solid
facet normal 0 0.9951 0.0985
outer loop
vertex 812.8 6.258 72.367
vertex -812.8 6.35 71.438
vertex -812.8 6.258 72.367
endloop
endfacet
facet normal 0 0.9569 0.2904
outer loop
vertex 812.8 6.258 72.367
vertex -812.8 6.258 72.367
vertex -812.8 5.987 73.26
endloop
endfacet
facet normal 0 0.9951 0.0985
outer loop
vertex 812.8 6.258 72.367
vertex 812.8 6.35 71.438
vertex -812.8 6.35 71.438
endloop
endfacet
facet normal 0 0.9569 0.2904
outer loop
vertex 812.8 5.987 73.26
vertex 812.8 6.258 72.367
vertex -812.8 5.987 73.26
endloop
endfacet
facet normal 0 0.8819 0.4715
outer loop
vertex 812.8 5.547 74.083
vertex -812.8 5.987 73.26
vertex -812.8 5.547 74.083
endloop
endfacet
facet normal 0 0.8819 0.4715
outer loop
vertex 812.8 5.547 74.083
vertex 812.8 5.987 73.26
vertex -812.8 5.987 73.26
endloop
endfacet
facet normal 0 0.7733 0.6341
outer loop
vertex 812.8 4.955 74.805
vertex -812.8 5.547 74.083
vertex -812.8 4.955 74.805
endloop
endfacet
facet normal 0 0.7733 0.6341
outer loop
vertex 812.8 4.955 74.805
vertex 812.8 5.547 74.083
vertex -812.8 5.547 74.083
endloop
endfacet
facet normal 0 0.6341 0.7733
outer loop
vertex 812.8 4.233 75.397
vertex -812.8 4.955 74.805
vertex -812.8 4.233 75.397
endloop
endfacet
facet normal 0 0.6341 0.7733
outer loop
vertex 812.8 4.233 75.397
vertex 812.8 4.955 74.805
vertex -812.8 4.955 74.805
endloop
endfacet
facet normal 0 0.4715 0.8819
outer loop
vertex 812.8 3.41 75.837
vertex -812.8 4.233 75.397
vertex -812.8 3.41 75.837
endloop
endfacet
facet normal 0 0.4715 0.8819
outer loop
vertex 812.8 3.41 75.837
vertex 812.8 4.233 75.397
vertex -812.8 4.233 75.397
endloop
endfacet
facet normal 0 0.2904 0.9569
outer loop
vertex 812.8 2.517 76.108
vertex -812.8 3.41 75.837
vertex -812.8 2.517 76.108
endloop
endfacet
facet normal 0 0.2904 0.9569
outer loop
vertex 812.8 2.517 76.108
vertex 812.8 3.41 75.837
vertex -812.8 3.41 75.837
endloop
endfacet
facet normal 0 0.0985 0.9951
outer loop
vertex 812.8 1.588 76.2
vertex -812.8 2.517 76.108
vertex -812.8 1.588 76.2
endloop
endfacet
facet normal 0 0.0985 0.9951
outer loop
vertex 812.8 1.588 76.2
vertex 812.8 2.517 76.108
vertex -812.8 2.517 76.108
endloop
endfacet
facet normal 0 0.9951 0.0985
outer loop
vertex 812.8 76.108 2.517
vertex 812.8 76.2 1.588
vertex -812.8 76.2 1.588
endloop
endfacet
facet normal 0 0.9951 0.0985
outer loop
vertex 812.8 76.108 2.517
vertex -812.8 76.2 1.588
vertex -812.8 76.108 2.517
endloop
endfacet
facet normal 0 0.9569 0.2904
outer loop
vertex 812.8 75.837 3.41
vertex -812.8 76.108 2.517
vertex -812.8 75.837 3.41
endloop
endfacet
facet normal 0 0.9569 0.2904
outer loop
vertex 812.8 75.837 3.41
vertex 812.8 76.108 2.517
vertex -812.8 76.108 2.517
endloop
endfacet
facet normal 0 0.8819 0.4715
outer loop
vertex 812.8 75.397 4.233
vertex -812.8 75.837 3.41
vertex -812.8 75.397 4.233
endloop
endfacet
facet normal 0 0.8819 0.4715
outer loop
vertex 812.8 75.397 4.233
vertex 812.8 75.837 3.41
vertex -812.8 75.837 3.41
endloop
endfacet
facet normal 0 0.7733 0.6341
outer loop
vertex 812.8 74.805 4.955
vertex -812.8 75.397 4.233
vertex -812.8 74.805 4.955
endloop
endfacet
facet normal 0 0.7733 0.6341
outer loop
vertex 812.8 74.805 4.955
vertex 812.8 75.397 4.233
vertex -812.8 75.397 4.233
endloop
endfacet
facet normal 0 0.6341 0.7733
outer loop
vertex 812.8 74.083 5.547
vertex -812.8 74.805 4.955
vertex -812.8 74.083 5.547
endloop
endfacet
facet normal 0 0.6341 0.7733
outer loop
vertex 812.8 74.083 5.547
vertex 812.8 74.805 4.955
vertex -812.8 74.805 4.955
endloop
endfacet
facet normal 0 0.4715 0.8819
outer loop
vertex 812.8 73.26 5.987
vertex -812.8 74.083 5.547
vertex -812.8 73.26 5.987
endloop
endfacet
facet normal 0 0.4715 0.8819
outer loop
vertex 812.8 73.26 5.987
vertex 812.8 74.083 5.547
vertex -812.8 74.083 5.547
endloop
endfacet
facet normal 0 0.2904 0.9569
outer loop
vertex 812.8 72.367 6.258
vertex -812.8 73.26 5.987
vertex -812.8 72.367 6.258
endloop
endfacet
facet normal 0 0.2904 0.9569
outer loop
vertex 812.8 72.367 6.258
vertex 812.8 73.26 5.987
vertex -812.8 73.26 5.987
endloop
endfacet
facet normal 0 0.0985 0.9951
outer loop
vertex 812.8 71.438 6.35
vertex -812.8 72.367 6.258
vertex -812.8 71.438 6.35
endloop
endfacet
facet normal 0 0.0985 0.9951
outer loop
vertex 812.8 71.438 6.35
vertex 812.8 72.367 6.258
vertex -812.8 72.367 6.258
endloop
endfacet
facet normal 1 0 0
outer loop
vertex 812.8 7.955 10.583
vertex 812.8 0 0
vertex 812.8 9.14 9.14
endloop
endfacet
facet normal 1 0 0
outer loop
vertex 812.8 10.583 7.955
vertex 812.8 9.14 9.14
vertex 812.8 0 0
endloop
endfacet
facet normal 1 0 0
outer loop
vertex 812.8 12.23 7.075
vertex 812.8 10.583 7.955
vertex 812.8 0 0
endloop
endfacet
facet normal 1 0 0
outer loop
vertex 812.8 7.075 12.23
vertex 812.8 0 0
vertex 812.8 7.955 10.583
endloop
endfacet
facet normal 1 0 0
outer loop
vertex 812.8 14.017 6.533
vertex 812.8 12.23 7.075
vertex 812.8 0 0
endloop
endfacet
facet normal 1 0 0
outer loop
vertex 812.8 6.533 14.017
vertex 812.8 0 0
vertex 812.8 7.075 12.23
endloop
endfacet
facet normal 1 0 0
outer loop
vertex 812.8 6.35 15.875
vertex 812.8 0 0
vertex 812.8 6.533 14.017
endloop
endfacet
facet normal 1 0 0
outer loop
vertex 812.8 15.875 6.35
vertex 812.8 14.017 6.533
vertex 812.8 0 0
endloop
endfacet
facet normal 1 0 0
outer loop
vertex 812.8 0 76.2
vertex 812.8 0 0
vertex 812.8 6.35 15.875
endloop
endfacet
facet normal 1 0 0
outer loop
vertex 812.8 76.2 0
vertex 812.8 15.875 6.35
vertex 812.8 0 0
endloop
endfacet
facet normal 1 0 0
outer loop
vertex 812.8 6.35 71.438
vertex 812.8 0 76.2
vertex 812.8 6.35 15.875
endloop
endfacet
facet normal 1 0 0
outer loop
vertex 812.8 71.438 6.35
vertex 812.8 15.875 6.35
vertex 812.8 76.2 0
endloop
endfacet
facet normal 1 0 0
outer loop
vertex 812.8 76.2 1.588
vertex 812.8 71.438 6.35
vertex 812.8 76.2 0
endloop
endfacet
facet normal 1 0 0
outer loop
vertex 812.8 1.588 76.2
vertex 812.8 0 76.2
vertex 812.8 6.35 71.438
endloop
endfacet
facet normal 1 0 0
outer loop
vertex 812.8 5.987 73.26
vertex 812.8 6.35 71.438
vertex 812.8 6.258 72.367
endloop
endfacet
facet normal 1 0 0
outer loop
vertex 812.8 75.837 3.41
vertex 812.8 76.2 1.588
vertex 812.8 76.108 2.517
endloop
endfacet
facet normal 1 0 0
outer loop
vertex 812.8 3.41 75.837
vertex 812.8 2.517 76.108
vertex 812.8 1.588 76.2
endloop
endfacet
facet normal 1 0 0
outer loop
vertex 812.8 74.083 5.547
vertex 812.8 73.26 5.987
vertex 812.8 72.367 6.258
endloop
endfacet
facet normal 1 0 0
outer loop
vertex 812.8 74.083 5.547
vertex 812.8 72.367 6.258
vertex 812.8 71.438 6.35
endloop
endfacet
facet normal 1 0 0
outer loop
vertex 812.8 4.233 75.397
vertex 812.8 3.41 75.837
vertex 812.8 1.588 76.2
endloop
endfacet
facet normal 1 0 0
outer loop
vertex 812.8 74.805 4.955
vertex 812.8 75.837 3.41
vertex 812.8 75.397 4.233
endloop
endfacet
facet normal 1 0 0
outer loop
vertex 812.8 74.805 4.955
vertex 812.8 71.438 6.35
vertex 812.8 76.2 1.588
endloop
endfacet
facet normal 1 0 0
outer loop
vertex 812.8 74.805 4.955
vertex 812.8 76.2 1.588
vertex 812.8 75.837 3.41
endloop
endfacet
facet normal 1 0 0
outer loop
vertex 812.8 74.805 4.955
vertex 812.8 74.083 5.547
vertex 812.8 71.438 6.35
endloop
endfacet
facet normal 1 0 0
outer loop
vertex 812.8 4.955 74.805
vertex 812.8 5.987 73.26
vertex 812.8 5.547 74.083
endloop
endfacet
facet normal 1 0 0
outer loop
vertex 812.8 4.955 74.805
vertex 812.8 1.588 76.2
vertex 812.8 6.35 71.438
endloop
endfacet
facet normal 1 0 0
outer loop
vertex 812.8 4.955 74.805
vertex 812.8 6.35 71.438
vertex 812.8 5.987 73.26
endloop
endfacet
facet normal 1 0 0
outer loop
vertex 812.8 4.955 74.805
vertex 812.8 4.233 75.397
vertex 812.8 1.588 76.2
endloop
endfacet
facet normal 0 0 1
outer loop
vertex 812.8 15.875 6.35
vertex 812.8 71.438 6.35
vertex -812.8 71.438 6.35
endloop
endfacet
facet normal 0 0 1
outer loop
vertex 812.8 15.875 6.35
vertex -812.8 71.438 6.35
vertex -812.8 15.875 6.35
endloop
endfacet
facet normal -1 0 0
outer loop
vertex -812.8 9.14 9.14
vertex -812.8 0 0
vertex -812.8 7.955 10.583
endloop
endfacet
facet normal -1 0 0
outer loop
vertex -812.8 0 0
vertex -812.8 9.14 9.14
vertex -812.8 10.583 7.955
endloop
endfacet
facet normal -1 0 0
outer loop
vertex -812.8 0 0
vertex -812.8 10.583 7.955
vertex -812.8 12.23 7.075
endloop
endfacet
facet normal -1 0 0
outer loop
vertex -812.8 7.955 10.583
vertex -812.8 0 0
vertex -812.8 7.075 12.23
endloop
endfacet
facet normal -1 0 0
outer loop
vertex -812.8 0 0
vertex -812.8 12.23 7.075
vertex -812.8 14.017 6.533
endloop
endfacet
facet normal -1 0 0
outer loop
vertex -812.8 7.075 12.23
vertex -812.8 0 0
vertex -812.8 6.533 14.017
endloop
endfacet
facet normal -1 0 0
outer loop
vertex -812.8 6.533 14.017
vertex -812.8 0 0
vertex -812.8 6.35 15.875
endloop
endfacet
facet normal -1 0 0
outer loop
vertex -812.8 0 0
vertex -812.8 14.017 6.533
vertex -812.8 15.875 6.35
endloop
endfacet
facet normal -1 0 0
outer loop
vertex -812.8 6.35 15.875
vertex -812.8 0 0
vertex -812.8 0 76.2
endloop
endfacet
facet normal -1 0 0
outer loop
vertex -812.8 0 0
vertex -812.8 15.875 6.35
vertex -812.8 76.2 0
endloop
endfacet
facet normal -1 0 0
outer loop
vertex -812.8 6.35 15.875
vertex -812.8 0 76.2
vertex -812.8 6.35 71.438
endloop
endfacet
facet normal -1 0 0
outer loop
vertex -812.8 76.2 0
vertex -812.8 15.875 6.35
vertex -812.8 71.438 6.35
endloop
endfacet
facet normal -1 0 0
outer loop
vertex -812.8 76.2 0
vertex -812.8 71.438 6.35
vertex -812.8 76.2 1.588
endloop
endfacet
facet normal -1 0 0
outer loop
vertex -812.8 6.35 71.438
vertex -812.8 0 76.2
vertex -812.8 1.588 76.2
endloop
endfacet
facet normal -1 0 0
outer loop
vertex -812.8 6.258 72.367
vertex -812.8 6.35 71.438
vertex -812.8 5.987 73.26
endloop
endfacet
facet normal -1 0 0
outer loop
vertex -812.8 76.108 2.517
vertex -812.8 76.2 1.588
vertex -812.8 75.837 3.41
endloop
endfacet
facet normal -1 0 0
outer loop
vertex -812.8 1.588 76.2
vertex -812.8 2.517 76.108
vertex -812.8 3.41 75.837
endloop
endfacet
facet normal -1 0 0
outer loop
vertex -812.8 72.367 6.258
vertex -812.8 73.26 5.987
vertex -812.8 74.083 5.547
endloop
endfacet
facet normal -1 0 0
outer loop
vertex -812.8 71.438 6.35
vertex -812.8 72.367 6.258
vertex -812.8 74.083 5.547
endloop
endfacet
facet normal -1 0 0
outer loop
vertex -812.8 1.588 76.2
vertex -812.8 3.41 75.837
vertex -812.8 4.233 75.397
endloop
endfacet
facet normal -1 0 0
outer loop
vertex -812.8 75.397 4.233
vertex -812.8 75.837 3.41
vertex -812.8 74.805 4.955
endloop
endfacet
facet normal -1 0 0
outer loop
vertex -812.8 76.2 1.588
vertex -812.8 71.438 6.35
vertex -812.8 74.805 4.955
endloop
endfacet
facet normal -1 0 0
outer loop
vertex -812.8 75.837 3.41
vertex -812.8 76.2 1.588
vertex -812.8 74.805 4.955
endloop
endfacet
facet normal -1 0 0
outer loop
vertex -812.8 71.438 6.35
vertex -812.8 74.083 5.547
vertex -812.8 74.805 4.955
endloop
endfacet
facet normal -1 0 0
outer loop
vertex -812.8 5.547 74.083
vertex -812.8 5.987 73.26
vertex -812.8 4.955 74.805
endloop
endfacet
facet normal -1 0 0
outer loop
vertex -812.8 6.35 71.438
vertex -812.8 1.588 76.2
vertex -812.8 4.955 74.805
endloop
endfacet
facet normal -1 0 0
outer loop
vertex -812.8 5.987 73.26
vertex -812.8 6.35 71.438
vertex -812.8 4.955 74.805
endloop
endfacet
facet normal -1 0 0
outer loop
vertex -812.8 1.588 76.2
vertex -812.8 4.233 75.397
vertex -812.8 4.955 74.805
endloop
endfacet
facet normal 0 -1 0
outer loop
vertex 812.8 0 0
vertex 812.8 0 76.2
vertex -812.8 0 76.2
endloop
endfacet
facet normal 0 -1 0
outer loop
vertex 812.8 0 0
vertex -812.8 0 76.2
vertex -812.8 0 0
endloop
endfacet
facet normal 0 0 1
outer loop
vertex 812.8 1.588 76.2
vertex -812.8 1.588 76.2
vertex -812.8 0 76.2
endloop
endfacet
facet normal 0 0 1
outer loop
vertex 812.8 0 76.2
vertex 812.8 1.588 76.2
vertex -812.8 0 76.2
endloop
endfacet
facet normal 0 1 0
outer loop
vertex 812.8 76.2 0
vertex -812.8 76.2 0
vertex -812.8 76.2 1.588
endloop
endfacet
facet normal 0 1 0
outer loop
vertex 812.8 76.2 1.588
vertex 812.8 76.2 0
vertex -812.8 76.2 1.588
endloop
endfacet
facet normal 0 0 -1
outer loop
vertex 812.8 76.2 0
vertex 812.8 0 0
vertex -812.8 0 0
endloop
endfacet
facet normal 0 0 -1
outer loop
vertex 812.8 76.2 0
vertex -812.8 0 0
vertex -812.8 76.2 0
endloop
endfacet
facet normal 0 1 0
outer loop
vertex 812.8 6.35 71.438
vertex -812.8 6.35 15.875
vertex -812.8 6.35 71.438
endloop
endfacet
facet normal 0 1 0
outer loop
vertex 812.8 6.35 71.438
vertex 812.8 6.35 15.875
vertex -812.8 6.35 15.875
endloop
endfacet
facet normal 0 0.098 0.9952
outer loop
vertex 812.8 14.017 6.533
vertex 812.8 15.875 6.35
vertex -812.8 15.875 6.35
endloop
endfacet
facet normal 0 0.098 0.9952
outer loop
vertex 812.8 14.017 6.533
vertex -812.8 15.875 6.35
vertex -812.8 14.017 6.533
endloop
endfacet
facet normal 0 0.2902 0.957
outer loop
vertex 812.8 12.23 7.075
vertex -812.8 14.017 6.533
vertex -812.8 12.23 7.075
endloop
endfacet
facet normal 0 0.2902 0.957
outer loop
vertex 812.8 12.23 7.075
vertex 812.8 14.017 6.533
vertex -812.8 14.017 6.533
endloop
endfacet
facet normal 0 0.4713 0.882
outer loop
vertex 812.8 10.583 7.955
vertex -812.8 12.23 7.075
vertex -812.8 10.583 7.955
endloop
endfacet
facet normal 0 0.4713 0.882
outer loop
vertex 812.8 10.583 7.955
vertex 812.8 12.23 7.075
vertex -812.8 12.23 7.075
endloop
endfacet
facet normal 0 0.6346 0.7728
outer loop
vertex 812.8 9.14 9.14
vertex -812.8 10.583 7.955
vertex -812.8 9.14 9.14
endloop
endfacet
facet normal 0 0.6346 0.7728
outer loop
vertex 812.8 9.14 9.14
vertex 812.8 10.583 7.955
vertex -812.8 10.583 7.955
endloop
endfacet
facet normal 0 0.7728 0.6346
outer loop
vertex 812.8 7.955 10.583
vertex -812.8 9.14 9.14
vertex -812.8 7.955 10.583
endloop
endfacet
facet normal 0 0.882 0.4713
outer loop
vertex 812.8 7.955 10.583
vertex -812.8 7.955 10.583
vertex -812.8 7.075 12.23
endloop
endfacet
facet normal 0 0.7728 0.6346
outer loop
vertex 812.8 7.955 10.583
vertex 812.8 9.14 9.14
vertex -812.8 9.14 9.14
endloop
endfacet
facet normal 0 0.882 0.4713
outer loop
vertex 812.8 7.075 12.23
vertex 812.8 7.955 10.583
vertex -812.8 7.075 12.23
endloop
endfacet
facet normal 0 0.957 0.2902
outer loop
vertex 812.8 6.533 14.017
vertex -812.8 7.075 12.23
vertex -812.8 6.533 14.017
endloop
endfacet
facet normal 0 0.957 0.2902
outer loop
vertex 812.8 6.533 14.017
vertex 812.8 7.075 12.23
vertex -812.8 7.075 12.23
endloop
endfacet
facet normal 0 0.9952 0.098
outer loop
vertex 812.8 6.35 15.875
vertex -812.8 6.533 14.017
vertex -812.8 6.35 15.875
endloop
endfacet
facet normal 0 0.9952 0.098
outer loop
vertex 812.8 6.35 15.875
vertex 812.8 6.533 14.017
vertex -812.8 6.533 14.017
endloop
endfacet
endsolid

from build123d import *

# Parameters (mm, degrees)
F1_DEPTH = 812.8


with BuildPart() as f1:
    # F0 (on Right) → F1 (new body, symmetric)
    with BuildSketch(Plane.YZ):
        with BuildLine():
            Line((1.5875, 76.2), (0, 76.2))
            Line((0, 76.2), (0, 0))
            Line((0, 0), (76.2, 0))
            Line((76.2, 0), (76.2, 1.5875))
            ThreePointArc((76.2, 1.5875), (74.805096, 4.955096), (71.4375, 6.35))
            Line((71.4375, 6.35), (15.875, 6.35))
            ThreePointArc((15.875, 6.35), (9.139808, 9.139808), (6.35, 15.875))
            Line((6.35, 15.875), (6.35, 71.4375))
            ThreePointArc((6.35, 71.4375), (4.955096, 74.805096), (1.5875, 76.2))
        make_face()
    extrude(amount=F1_DEPTH, both=True)


solid = f1.part
